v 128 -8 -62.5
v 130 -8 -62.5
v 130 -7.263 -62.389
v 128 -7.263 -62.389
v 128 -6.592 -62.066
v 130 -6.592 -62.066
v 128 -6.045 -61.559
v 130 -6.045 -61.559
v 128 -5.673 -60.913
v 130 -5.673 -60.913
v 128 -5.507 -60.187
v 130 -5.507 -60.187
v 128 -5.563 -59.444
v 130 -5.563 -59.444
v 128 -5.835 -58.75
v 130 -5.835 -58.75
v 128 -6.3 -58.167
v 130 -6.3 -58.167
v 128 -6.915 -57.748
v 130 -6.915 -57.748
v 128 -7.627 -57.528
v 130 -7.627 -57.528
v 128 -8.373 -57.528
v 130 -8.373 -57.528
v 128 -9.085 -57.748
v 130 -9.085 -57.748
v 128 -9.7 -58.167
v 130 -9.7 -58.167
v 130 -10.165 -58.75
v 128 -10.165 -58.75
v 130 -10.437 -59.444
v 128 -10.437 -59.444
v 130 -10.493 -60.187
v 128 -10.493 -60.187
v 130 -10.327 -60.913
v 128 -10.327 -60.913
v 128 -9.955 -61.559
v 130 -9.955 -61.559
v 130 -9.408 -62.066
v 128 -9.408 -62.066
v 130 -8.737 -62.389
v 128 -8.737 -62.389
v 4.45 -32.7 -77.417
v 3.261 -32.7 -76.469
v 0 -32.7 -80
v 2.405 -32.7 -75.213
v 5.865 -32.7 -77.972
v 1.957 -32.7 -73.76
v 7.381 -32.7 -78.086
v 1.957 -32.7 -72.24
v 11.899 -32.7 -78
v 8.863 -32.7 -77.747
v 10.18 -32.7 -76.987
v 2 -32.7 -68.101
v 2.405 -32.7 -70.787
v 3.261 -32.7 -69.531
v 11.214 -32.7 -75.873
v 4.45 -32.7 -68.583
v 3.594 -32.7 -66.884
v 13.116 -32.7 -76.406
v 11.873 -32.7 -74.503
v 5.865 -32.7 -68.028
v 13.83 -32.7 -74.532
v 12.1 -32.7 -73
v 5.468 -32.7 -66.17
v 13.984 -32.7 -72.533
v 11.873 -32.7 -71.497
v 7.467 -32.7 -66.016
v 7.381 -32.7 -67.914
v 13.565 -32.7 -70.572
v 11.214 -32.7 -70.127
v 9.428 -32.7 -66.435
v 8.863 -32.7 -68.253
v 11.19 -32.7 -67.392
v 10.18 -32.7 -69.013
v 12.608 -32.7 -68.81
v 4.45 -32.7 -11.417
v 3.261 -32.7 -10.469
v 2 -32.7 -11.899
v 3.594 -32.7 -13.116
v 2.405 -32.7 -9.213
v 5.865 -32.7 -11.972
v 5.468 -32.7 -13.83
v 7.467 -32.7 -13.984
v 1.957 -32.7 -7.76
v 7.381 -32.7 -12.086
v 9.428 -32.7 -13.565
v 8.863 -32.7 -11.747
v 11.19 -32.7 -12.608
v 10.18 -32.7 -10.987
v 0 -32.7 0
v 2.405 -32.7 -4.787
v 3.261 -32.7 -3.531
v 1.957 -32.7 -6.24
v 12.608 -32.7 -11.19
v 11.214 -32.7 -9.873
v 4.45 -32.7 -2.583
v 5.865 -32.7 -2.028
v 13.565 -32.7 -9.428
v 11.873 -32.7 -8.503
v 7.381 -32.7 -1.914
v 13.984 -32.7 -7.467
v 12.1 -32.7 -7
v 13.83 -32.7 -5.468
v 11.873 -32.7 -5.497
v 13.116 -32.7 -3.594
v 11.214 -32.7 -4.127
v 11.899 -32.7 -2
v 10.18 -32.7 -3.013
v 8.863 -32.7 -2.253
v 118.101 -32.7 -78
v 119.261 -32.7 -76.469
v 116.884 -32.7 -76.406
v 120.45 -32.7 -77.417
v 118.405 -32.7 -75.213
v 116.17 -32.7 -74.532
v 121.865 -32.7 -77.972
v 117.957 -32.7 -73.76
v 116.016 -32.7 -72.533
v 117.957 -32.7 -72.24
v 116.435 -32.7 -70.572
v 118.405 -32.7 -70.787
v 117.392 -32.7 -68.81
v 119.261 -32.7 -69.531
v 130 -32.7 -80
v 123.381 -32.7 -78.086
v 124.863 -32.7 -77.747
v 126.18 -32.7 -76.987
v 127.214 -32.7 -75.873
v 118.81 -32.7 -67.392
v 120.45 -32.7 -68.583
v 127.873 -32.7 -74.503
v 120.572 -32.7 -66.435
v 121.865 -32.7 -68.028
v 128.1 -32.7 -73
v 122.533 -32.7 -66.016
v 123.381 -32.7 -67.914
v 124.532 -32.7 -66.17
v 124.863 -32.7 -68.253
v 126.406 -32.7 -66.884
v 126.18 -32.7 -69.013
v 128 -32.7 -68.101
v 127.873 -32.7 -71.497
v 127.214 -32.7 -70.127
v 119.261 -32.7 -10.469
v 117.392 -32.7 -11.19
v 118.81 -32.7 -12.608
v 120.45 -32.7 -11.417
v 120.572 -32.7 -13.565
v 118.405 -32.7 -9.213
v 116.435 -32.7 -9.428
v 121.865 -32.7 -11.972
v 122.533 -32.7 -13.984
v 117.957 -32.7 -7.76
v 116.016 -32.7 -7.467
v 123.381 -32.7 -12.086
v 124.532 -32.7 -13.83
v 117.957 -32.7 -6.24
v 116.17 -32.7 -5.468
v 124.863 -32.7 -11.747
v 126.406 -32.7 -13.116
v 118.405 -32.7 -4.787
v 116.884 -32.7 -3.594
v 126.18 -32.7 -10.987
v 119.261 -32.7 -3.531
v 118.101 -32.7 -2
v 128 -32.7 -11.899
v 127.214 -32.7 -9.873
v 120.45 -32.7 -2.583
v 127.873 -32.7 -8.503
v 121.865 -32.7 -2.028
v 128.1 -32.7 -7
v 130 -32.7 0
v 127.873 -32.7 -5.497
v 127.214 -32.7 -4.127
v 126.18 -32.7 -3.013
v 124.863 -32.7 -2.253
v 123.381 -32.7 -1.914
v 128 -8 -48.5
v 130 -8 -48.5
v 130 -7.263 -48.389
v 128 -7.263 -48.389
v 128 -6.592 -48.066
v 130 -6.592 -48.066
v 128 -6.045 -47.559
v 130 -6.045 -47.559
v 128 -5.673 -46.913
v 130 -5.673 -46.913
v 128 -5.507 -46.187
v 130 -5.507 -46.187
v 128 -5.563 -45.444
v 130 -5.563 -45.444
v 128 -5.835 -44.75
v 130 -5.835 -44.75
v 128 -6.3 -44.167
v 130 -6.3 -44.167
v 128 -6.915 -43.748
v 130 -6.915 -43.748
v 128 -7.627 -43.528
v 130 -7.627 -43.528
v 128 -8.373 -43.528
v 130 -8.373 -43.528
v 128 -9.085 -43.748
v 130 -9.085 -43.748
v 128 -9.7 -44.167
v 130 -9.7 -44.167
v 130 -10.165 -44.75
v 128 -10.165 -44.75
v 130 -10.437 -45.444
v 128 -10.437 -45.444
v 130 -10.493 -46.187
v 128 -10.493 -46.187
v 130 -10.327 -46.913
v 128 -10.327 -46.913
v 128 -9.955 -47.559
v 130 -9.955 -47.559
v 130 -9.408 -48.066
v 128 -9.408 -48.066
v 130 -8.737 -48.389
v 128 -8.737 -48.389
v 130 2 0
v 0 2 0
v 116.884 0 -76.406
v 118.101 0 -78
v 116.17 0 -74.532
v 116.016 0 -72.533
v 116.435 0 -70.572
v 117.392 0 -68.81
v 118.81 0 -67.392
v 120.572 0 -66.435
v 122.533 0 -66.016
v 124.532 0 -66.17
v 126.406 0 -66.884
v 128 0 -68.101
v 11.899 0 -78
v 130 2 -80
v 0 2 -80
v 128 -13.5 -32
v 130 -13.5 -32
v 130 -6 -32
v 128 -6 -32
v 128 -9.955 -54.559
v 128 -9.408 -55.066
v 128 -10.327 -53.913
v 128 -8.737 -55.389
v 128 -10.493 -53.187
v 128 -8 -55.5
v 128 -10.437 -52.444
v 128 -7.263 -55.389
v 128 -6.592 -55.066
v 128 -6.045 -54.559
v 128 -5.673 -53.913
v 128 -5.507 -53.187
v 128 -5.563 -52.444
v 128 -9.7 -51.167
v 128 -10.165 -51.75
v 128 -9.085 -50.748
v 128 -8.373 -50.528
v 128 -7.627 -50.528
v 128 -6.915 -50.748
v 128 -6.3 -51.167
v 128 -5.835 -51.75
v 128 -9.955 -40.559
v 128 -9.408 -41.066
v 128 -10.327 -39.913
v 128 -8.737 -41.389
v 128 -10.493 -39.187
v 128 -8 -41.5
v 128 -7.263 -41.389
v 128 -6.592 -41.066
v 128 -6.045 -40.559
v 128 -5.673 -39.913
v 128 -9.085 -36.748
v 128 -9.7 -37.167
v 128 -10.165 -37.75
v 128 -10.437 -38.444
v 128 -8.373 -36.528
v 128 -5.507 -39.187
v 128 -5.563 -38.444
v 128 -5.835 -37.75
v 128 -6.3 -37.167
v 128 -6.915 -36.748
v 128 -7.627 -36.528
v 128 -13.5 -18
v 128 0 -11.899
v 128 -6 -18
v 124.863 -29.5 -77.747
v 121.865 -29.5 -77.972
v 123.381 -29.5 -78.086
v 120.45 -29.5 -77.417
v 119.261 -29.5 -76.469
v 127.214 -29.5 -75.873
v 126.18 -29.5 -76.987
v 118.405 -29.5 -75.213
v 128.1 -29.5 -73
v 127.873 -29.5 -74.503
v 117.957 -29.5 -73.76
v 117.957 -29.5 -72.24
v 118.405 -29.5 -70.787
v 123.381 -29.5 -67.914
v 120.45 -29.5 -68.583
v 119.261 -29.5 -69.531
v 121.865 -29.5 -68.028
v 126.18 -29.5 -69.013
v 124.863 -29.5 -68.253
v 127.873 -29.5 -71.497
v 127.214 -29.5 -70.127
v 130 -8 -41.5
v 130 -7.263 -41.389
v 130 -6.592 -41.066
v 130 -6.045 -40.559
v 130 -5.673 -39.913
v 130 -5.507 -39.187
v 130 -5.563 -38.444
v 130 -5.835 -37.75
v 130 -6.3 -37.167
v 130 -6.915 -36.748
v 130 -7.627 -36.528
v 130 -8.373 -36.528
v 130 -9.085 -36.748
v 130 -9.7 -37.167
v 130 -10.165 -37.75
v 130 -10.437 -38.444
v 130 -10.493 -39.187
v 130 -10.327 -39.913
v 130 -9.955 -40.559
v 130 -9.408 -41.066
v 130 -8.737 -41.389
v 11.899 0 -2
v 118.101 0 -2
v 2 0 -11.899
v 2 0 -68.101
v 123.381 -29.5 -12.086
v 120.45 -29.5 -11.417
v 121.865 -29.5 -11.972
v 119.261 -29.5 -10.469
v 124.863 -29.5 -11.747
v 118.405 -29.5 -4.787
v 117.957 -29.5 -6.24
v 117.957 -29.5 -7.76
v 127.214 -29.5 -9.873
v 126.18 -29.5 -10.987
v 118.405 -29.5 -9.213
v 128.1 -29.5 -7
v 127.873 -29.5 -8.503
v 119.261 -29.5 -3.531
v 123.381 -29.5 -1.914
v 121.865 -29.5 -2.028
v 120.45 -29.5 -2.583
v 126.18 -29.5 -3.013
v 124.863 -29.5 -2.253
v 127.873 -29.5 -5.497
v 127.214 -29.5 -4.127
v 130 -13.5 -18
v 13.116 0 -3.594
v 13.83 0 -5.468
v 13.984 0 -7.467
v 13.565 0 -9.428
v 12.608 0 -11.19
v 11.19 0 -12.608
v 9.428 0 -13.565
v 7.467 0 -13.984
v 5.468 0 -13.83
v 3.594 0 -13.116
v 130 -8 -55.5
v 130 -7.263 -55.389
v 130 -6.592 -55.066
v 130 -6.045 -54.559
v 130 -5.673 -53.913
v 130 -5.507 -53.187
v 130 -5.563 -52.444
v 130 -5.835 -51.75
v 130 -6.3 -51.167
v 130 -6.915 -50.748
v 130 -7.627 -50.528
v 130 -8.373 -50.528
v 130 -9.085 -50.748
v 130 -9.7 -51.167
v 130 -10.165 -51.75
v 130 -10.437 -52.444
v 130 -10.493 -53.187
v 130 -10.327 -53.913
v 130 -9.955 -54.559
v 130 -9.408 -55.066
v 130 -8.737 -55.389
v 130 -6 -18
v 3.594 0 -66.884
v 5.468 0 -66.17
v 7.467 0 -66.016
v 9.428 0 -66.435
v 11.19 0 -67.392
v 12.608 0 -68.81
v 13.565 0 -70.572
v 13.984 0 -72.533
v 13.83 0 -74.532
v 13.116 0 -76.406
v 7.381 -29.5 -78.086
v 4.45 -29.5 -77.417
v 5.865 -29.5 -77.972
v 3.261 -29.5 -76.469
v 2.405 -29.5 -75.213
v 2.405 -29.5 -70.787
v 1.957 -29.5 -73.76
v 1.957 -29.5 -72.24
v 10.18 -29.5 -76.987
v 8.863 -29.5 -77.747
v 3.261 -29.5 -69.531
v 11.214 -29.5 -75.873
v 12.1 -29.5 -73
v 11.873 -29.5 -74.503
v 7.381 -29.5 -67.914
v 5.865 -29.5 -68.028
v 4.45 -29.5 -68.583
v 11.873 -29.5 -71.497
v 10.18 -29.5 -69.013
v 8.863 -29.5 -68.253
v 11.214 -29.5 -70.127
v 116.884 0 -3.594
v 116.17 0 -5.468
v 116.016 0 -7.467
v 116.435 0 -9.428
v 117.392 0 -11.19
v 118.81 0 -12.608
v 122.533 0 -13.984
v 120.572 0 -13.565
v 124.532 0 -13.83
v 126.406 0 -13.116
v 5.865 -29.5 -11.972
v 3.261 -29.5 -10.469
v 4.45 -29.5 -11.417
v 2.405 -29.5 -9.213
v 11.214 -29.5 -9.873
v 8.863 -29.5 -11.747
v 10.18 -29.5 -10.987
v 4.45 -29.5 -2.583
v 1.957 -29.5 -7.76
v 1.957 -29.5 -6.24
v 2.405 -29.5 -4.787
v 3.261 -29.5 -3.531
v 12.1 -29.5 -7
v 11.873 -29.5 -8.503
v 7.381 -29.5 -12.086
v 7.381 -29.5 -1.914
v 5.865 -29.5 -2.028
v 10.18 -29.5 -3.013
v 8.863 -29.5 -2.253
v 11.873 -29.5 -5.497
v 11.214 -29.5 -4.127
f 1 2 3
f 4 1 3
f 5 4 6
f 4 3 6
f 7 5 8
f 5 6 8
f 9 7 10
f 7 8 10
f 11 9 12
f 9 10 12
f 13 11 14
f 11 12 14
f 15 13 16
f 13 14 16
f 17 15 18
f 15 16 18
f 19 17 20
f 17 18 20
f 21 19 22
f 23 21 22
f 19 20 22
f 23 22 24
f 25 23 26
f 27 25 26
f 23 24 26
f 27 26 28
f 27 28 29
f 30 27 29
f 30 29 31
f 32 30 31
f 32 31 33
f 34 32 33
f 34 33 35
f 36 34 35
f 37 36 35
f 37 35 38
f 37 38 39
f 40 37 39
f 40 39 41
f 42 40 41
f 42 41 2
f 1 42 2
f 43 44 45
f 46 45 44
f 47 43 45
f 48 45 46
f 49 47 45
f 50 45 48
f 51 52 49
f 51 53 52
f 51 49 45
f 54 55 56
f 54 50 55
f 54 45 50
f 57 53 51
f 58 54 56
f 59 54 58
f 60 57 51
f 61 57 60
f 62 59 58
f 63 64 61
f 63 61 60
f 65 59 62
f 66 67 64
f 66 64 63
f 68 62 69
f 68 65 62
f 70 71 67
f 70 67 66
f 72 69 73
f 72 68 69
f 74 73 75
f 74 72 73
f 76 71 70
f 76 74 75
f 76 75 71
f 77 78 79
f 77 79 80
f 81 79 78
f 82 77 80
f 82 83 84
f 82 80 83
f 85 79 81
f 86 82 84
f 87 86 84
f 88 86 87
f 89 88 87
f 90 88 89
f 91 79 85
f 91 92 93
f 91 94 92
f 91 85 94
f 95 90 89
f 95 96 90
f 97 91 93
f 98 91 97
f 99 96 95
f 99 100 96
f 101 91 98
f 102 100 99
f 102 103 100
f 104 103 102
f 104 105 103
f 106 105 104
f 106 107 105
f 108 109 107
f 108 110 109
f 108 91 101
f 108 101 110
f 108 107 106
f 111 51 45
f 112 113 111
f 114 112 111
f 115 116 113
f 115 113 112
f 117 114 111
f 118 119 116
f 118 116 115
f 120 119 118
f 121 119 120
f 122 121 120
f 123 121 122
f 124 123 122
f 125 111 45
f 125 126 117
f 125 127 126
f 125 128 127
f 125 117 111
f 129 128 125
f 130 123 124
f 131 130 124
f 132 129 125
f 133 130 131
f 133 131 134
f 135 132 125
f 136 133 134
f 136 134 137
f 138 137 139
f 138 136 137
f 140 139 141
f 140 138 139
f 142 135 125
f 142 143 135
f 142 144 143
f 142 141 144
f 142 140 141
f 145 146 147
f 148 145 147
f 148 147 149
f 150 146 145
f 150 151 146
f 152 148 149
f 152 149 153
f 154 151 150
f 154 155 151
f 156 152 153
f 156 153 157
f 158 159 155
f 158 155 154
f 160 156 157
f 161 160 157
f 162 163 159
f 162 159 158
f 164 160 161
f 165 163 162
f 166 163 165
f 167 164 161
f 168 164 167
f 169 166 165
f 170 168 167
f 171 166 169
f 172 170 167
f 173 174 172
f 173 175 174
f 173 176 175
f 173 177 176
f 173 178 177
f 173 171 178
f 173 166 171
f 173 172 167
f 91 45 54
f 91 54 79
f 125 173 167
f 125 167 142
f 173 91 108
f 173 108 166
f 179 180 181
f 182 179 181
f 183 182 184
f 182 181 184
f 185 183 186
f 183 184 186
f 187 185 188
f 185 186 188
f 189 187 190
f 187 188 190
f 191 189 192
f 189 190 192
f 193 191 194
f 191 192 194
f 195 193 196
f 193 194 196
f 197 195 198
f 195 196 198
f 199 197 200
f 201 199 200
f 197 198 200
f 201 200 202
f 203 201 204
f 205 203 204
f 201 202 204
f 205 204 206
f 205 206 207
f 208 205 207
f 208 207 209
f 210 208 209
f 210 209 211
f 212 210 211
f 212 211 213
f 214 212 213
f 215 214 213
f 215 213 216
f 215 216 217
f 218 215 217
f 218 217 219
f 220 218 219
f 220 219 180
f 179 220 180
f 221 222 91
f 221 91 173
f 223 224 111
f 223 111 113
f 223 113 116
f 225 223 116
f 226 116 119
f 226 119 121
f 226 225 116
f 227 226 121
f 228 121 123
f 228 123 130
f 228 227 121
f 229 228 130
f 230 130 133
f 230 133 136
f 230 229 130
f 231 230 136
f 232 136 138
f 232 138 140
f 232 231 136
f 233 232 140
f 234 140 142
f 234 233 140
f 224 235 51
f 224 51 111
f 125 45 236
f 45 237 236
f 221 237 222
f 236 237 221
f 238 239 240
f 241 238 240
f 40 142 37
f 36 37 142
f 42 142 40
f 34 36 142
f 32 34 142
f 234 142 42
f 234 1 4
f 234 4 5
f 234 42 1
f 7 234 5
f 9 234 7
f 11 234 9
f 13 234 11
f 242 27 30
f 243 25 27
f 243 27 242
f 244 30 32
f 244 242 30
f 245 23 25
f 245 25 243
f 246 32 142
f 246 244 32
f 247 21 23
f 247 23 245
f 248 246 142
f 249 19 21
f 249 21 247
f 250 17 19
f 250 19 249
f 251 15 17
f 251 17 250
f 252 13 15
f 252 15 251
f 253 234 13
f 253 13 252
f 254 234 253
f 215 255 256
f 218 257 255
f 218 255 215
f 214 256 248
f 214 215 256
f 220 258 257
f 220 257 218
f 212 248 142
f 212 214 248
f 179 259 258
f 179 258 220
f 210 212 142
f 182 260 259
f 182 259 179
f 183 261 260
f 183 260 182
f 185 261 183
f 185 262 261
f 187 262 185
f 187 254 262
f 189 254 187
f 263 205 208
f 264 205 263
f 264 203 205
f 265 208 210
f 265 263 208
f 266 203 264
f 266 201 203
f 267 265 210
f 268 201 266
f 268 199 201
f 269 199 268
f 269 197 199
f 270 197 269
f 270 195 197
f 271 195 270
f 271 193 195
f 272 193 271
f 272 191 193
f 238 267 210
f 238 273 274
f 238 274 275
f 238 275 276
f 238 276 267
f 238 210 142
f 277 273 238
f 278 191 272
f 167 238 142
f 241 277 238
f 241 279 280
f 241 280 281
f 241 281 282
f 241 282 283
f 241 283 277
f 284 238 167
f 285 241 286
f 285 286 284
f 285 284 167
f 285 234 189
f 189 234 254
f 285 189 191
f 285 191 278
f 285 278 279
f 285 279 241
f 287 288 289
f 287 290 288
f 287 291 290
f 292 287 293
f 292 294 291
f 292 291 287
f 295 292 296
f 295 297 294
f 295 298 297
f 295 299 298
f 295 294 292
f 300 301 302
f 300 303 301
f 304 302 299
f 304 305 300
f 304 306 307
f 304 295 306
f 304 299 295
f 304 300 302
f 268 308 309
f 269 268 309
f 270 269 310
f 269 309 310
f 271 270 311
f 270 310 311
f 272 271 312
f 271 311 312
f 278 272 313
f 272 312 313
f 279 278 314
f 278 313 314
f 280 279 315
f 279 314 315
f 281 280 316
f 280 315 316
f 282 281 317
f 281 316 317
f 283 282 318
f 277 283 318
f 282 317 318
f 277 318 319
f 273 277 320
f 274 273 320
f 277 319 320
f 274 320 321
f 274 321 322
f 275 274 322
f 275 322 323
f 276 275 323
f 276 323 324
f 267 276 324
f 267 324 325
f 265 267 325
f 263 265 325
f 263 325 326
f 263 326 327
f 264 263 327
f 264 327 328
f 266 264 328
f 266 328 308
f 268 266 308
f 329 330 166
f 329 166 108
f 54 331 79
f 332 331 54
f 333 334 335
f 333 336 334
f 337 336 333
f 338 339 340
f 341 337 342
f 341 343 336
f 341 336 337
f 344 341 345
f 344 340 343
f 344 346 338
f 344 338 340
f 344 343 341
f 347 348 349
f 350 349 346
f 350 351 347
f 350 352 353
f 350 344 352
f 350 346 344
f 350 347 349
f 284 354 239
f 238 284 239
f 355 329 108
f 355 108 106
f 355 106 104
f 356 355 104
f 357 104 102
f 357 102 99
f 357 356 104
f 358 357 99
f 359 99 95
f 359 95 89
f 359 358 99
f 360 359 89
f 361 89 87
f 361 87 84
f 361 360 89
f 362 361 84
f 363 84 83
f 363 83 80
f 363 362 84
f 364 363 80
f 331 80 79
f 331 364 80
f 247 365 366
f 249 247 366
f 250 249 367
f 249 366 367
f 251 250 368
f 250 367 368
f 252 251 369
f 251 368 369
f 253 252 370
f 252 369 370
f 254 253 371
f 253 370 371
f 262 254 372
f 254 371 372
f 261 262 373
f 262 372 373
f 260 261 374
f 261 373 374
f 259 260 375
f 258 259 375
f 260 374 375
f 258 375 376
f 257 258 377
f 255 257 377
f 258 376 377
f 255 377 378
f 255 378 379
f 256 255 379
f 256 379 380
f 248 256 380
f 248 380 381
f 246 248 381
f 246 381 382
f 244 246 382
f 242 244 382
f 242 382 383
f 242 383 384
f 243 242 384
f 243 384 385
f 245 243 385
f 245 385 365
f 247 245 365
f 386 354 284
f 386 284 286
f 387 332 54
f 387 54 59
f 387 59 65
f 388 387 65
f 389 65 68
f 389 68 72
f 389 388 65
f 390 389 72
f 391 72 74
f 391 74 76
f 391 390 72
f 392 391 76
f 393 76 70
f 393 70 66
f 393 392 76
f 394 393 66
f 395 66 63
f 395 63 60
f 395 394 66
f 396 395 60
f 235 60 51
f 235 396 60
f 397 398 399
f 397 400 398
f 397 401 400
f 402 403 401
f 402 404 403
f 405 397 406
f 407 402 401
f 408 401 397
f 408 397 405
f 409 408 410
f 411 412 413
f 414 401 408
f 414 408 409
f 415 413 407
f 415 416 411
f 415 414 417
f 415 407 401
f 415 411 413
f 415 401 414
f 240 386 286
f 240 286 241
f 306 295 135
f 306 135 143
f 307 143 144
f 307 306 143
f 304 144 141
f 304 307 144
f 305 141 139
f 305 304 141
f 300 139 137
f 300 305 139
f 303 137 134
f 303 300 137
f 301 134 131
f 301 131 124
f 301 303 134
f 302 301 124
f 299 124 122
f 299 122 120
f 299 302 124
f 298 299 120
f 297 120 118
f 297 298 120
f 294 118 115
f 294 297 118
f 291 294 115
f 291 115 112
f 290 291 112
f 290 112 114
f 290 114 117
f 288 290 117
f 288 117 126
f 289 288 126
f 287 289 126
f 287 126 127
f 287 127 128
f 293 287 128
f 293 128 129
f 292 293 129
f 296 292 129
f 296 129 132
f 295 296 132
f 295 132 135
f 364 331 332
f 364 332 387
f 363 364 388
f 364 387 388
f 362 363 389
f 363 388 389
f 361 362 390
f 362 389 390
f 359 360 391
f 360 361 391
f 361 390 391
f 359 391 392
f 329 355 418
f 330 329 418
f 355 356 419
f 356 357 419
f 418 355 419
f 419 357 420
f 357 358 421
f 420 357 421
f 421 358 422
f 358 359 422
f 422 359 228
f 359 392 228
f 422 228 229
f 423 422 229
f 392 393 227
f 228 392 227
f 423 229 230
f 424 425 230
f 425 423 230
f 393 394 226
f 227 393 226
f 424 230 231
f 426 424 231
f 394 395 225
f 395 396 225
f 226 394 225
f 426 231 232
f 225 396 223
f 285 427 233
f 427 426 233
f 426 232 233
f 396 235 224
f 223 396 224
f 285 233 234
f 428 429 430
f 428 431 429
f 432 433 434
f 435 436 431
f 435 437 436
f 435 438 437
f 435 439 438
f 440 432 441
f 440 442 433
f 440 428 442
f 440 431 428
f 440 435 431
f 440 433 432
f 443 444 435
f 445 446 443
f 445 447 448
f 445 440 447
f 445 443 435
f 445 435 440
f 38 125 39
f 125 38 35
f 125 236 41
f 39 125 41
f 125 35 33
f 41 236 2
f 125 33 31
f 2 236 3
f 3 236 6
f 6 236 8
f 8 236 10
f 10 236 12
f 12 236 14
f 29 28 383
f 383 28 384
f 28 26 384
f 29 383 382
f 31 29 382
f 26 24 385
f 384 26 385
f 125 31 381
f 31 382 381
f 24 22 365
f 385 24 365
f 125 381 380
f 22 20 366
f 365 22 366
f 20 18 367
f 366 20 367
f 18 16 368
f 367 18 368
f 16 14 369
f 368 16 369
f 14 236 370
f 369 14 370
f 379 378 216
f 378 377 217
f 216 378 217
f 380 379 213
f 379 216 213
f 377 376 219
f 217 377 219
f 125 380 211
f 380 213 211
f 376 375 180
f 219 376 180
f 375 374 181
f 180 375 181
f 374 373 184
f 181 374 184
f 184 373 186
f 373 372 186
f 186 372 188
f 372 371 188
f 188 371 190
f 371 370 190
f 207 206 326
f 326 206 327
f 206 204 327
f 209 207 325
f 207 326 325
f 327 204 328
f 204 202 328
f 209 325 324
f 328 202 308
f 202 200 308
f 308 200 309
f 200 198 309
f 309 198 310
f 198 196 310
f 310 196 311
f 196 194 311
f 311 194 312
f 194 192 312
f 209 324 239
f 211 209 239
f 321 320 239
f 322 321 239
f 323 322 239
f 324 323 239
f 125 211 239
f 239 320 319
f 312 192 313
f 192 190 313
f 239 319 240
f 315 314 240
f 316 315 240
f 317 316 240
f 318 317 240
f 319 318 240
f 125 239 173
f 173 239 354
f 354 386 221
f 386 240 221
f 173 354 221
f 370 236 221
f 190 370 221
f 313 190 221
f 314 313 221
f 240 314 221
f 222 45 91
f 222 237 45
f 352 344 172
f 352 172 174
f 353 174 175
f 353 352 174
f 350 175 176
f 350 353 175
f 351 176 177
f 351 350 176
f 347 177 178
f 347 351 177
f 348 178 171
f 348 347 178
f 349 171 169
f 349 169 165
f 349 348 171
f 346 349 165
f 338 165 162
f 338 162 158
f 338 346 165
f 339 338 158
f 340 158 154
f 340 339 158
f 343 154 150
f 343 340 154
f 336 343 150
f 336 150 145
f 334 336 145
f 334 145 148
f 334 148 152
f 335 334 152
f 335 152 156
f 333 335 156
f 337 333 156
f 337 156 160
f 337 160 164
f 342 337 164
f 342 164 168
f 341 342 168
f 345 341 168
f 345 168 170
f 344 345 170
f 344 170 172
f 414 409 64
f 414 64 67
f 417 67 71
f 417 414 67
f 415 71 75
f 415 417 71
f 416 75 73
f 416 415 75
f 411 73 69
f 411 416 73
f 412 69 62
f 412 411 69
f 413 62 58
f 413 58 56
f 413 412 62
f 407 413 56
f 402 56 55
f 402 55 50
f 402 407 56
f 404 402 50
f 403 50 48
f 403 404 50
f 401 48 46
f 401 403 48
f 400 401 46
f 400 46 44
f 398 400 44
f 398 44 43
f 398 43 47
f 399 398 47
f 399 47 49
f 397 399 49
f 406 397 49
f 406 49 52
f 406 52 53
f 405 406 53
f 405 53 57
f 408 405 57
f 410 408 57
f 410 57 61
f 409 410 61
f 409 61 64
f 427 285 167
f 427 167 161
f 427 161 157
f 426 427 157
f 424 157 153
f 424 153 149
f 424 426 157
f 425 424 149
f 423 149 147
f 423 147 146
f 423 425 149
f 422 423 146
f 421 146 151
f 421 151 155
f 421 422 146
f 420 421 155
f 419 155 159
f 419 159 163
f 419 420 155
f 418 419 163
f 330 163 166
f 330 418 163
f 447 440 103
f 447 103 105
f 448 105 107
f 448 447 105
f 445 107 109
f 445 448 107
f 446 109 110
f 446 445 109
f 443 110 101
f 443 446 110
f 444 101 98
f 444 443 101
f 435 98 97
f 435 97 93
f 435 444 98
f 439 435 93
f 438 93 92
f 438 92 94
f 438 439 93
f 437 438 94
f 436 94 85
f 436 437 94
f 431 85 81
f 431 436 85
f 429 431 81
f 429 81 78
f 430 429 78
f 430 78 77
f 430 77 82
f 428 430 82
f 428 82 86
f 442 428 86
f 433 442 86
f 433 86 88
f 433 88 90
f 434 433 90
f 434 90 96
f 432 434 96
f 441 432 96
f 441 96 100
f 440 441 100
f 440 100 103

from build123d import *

# Parameters (mm, degrees)
ESQUISSE1_W             = 130
ESQUISSE1_H             = 80
BOSS_EXTRU_1_DEPTH      = 2
ESQUISSE2_W             = 130
ESQUISSE2_H             = 80
ESQUISSE2_R             = 5.1
BOSS_EXTRU_2_DEPTH      = 32.7
ESQUISSE3_R             = 2.5
ESQUISSE3_W             = 14
ESQUISSE3_H             = 7.5
ENL_V_MAT_EXTRU_1_DEPTH = 10
ESQUISSE4_R             = 5.5
BOSS_EXTRU_3_DEPTH      = 29.5


with BuildPart() as part:
    # Esquisse1 → Boss.-Extru.1 (new body)
    with BuildSketch(Plane(origin=(0, 0, 0), x_dir=(1, 0, 0), z_dir=(0, 1, 0))):
        with Locations((65, 40)):
            Rectangle(ESQUISSE1_W, ESQUISSE1_H)
    extrude(amount=BOSS_EXTRU_1_DEPTH)

    # Esquisse2 → Boss.-Extru.2 (add)
    with BuildSketch(Plane.XZ):
        with Locations((65, -40)):
            Rectangle(ESQUISSE2_W, ESQUISSE2_H)
        with Locations((123, -7)):
            Circle(ESQUISSE2_R, mode=Mode.SUBTRACT)
        with Locations((123, -73)):
            Circle(ESQUISSE2_R, mode=Mode.SUBTRACT)
        with Locations((7, -7)):
            Circle(ESQUISSE2_R, mode=Mode.SUBTRACT)
        with Locations((7, -73)):
            Circle(ESQUISSE2_R, mode=Mode.SUBTRACT)
        with BuildLine():
            Line((11.898979486, -78), (118.101020514, -78))
            ThreePointArc((118.101020514, -78), (118.050252532, -68.050252532), (128, -68.101020514))
            Line((128, -68.101020514), (128, -11.898979486))
            ThreePointArc((128, -11.898979486), (118.050252532, -11.949747468), (118.101020514, -2))
            Line((118.101020514, -2), (11.898979486, -2))
            ThreePointArc((11.898979486, -2), (11.949747468, -11.949747468), (2, -11.898979486))
            Line((2, -11.898979486), (2, -68.101020514))
            ThreePointArc((2, -68.101020514), (11.949747468, -68.050252532), (11.898979486, -78))
        make_face(mode=Mode.SUBTRACT)
    extrude(amount=BOSS_EXTRU_2_DEPTH)

    # Esquisse3 → Enlèv. mat.-Extru.1 (cut)
    with BuildSketch(Plane(origin=(130, 0, 0), x_dir=(0, 0, -1), z_dir=(1, 0, 0))):
        with Locations((39, -8)):
            Circle(ESQUISSE3_R)
        with Locations((46, -8)):
            Circle(ESQUISSE3_R)
        with Locations((53, -8)):
            Circle(ESQUISSE3_R)
        with Locations((60, -8)):
            Circle(ESQUISSE3_R)
        with Locations((25, -9.75)):
            Rectangle(ESQUISSE3_W, ESQUISSE3_H)
    extrude(amount=-ENL_V_MAT_EXTRU_1_DEPTH, mode=Mode.SUBTRACT)

    # Esquisse4 → Boss.-Extru.3 (add)
    with BuildSketch(Plane.XZ):
        with Locations((7, -7)):
            Circle(ESQUISSE4_R)
        with Locations((123, -7)):
            Circle(ESQUISSE4_R)
        with Locations((123, -73)):
            Circle(ESQUISSE4_R)
        with Locations((7, -73)):
            Circle(ESQUISSE4_R)
    extrude(amount=BOSS_EXTRU_3_DEPTH)


solid = part.part
